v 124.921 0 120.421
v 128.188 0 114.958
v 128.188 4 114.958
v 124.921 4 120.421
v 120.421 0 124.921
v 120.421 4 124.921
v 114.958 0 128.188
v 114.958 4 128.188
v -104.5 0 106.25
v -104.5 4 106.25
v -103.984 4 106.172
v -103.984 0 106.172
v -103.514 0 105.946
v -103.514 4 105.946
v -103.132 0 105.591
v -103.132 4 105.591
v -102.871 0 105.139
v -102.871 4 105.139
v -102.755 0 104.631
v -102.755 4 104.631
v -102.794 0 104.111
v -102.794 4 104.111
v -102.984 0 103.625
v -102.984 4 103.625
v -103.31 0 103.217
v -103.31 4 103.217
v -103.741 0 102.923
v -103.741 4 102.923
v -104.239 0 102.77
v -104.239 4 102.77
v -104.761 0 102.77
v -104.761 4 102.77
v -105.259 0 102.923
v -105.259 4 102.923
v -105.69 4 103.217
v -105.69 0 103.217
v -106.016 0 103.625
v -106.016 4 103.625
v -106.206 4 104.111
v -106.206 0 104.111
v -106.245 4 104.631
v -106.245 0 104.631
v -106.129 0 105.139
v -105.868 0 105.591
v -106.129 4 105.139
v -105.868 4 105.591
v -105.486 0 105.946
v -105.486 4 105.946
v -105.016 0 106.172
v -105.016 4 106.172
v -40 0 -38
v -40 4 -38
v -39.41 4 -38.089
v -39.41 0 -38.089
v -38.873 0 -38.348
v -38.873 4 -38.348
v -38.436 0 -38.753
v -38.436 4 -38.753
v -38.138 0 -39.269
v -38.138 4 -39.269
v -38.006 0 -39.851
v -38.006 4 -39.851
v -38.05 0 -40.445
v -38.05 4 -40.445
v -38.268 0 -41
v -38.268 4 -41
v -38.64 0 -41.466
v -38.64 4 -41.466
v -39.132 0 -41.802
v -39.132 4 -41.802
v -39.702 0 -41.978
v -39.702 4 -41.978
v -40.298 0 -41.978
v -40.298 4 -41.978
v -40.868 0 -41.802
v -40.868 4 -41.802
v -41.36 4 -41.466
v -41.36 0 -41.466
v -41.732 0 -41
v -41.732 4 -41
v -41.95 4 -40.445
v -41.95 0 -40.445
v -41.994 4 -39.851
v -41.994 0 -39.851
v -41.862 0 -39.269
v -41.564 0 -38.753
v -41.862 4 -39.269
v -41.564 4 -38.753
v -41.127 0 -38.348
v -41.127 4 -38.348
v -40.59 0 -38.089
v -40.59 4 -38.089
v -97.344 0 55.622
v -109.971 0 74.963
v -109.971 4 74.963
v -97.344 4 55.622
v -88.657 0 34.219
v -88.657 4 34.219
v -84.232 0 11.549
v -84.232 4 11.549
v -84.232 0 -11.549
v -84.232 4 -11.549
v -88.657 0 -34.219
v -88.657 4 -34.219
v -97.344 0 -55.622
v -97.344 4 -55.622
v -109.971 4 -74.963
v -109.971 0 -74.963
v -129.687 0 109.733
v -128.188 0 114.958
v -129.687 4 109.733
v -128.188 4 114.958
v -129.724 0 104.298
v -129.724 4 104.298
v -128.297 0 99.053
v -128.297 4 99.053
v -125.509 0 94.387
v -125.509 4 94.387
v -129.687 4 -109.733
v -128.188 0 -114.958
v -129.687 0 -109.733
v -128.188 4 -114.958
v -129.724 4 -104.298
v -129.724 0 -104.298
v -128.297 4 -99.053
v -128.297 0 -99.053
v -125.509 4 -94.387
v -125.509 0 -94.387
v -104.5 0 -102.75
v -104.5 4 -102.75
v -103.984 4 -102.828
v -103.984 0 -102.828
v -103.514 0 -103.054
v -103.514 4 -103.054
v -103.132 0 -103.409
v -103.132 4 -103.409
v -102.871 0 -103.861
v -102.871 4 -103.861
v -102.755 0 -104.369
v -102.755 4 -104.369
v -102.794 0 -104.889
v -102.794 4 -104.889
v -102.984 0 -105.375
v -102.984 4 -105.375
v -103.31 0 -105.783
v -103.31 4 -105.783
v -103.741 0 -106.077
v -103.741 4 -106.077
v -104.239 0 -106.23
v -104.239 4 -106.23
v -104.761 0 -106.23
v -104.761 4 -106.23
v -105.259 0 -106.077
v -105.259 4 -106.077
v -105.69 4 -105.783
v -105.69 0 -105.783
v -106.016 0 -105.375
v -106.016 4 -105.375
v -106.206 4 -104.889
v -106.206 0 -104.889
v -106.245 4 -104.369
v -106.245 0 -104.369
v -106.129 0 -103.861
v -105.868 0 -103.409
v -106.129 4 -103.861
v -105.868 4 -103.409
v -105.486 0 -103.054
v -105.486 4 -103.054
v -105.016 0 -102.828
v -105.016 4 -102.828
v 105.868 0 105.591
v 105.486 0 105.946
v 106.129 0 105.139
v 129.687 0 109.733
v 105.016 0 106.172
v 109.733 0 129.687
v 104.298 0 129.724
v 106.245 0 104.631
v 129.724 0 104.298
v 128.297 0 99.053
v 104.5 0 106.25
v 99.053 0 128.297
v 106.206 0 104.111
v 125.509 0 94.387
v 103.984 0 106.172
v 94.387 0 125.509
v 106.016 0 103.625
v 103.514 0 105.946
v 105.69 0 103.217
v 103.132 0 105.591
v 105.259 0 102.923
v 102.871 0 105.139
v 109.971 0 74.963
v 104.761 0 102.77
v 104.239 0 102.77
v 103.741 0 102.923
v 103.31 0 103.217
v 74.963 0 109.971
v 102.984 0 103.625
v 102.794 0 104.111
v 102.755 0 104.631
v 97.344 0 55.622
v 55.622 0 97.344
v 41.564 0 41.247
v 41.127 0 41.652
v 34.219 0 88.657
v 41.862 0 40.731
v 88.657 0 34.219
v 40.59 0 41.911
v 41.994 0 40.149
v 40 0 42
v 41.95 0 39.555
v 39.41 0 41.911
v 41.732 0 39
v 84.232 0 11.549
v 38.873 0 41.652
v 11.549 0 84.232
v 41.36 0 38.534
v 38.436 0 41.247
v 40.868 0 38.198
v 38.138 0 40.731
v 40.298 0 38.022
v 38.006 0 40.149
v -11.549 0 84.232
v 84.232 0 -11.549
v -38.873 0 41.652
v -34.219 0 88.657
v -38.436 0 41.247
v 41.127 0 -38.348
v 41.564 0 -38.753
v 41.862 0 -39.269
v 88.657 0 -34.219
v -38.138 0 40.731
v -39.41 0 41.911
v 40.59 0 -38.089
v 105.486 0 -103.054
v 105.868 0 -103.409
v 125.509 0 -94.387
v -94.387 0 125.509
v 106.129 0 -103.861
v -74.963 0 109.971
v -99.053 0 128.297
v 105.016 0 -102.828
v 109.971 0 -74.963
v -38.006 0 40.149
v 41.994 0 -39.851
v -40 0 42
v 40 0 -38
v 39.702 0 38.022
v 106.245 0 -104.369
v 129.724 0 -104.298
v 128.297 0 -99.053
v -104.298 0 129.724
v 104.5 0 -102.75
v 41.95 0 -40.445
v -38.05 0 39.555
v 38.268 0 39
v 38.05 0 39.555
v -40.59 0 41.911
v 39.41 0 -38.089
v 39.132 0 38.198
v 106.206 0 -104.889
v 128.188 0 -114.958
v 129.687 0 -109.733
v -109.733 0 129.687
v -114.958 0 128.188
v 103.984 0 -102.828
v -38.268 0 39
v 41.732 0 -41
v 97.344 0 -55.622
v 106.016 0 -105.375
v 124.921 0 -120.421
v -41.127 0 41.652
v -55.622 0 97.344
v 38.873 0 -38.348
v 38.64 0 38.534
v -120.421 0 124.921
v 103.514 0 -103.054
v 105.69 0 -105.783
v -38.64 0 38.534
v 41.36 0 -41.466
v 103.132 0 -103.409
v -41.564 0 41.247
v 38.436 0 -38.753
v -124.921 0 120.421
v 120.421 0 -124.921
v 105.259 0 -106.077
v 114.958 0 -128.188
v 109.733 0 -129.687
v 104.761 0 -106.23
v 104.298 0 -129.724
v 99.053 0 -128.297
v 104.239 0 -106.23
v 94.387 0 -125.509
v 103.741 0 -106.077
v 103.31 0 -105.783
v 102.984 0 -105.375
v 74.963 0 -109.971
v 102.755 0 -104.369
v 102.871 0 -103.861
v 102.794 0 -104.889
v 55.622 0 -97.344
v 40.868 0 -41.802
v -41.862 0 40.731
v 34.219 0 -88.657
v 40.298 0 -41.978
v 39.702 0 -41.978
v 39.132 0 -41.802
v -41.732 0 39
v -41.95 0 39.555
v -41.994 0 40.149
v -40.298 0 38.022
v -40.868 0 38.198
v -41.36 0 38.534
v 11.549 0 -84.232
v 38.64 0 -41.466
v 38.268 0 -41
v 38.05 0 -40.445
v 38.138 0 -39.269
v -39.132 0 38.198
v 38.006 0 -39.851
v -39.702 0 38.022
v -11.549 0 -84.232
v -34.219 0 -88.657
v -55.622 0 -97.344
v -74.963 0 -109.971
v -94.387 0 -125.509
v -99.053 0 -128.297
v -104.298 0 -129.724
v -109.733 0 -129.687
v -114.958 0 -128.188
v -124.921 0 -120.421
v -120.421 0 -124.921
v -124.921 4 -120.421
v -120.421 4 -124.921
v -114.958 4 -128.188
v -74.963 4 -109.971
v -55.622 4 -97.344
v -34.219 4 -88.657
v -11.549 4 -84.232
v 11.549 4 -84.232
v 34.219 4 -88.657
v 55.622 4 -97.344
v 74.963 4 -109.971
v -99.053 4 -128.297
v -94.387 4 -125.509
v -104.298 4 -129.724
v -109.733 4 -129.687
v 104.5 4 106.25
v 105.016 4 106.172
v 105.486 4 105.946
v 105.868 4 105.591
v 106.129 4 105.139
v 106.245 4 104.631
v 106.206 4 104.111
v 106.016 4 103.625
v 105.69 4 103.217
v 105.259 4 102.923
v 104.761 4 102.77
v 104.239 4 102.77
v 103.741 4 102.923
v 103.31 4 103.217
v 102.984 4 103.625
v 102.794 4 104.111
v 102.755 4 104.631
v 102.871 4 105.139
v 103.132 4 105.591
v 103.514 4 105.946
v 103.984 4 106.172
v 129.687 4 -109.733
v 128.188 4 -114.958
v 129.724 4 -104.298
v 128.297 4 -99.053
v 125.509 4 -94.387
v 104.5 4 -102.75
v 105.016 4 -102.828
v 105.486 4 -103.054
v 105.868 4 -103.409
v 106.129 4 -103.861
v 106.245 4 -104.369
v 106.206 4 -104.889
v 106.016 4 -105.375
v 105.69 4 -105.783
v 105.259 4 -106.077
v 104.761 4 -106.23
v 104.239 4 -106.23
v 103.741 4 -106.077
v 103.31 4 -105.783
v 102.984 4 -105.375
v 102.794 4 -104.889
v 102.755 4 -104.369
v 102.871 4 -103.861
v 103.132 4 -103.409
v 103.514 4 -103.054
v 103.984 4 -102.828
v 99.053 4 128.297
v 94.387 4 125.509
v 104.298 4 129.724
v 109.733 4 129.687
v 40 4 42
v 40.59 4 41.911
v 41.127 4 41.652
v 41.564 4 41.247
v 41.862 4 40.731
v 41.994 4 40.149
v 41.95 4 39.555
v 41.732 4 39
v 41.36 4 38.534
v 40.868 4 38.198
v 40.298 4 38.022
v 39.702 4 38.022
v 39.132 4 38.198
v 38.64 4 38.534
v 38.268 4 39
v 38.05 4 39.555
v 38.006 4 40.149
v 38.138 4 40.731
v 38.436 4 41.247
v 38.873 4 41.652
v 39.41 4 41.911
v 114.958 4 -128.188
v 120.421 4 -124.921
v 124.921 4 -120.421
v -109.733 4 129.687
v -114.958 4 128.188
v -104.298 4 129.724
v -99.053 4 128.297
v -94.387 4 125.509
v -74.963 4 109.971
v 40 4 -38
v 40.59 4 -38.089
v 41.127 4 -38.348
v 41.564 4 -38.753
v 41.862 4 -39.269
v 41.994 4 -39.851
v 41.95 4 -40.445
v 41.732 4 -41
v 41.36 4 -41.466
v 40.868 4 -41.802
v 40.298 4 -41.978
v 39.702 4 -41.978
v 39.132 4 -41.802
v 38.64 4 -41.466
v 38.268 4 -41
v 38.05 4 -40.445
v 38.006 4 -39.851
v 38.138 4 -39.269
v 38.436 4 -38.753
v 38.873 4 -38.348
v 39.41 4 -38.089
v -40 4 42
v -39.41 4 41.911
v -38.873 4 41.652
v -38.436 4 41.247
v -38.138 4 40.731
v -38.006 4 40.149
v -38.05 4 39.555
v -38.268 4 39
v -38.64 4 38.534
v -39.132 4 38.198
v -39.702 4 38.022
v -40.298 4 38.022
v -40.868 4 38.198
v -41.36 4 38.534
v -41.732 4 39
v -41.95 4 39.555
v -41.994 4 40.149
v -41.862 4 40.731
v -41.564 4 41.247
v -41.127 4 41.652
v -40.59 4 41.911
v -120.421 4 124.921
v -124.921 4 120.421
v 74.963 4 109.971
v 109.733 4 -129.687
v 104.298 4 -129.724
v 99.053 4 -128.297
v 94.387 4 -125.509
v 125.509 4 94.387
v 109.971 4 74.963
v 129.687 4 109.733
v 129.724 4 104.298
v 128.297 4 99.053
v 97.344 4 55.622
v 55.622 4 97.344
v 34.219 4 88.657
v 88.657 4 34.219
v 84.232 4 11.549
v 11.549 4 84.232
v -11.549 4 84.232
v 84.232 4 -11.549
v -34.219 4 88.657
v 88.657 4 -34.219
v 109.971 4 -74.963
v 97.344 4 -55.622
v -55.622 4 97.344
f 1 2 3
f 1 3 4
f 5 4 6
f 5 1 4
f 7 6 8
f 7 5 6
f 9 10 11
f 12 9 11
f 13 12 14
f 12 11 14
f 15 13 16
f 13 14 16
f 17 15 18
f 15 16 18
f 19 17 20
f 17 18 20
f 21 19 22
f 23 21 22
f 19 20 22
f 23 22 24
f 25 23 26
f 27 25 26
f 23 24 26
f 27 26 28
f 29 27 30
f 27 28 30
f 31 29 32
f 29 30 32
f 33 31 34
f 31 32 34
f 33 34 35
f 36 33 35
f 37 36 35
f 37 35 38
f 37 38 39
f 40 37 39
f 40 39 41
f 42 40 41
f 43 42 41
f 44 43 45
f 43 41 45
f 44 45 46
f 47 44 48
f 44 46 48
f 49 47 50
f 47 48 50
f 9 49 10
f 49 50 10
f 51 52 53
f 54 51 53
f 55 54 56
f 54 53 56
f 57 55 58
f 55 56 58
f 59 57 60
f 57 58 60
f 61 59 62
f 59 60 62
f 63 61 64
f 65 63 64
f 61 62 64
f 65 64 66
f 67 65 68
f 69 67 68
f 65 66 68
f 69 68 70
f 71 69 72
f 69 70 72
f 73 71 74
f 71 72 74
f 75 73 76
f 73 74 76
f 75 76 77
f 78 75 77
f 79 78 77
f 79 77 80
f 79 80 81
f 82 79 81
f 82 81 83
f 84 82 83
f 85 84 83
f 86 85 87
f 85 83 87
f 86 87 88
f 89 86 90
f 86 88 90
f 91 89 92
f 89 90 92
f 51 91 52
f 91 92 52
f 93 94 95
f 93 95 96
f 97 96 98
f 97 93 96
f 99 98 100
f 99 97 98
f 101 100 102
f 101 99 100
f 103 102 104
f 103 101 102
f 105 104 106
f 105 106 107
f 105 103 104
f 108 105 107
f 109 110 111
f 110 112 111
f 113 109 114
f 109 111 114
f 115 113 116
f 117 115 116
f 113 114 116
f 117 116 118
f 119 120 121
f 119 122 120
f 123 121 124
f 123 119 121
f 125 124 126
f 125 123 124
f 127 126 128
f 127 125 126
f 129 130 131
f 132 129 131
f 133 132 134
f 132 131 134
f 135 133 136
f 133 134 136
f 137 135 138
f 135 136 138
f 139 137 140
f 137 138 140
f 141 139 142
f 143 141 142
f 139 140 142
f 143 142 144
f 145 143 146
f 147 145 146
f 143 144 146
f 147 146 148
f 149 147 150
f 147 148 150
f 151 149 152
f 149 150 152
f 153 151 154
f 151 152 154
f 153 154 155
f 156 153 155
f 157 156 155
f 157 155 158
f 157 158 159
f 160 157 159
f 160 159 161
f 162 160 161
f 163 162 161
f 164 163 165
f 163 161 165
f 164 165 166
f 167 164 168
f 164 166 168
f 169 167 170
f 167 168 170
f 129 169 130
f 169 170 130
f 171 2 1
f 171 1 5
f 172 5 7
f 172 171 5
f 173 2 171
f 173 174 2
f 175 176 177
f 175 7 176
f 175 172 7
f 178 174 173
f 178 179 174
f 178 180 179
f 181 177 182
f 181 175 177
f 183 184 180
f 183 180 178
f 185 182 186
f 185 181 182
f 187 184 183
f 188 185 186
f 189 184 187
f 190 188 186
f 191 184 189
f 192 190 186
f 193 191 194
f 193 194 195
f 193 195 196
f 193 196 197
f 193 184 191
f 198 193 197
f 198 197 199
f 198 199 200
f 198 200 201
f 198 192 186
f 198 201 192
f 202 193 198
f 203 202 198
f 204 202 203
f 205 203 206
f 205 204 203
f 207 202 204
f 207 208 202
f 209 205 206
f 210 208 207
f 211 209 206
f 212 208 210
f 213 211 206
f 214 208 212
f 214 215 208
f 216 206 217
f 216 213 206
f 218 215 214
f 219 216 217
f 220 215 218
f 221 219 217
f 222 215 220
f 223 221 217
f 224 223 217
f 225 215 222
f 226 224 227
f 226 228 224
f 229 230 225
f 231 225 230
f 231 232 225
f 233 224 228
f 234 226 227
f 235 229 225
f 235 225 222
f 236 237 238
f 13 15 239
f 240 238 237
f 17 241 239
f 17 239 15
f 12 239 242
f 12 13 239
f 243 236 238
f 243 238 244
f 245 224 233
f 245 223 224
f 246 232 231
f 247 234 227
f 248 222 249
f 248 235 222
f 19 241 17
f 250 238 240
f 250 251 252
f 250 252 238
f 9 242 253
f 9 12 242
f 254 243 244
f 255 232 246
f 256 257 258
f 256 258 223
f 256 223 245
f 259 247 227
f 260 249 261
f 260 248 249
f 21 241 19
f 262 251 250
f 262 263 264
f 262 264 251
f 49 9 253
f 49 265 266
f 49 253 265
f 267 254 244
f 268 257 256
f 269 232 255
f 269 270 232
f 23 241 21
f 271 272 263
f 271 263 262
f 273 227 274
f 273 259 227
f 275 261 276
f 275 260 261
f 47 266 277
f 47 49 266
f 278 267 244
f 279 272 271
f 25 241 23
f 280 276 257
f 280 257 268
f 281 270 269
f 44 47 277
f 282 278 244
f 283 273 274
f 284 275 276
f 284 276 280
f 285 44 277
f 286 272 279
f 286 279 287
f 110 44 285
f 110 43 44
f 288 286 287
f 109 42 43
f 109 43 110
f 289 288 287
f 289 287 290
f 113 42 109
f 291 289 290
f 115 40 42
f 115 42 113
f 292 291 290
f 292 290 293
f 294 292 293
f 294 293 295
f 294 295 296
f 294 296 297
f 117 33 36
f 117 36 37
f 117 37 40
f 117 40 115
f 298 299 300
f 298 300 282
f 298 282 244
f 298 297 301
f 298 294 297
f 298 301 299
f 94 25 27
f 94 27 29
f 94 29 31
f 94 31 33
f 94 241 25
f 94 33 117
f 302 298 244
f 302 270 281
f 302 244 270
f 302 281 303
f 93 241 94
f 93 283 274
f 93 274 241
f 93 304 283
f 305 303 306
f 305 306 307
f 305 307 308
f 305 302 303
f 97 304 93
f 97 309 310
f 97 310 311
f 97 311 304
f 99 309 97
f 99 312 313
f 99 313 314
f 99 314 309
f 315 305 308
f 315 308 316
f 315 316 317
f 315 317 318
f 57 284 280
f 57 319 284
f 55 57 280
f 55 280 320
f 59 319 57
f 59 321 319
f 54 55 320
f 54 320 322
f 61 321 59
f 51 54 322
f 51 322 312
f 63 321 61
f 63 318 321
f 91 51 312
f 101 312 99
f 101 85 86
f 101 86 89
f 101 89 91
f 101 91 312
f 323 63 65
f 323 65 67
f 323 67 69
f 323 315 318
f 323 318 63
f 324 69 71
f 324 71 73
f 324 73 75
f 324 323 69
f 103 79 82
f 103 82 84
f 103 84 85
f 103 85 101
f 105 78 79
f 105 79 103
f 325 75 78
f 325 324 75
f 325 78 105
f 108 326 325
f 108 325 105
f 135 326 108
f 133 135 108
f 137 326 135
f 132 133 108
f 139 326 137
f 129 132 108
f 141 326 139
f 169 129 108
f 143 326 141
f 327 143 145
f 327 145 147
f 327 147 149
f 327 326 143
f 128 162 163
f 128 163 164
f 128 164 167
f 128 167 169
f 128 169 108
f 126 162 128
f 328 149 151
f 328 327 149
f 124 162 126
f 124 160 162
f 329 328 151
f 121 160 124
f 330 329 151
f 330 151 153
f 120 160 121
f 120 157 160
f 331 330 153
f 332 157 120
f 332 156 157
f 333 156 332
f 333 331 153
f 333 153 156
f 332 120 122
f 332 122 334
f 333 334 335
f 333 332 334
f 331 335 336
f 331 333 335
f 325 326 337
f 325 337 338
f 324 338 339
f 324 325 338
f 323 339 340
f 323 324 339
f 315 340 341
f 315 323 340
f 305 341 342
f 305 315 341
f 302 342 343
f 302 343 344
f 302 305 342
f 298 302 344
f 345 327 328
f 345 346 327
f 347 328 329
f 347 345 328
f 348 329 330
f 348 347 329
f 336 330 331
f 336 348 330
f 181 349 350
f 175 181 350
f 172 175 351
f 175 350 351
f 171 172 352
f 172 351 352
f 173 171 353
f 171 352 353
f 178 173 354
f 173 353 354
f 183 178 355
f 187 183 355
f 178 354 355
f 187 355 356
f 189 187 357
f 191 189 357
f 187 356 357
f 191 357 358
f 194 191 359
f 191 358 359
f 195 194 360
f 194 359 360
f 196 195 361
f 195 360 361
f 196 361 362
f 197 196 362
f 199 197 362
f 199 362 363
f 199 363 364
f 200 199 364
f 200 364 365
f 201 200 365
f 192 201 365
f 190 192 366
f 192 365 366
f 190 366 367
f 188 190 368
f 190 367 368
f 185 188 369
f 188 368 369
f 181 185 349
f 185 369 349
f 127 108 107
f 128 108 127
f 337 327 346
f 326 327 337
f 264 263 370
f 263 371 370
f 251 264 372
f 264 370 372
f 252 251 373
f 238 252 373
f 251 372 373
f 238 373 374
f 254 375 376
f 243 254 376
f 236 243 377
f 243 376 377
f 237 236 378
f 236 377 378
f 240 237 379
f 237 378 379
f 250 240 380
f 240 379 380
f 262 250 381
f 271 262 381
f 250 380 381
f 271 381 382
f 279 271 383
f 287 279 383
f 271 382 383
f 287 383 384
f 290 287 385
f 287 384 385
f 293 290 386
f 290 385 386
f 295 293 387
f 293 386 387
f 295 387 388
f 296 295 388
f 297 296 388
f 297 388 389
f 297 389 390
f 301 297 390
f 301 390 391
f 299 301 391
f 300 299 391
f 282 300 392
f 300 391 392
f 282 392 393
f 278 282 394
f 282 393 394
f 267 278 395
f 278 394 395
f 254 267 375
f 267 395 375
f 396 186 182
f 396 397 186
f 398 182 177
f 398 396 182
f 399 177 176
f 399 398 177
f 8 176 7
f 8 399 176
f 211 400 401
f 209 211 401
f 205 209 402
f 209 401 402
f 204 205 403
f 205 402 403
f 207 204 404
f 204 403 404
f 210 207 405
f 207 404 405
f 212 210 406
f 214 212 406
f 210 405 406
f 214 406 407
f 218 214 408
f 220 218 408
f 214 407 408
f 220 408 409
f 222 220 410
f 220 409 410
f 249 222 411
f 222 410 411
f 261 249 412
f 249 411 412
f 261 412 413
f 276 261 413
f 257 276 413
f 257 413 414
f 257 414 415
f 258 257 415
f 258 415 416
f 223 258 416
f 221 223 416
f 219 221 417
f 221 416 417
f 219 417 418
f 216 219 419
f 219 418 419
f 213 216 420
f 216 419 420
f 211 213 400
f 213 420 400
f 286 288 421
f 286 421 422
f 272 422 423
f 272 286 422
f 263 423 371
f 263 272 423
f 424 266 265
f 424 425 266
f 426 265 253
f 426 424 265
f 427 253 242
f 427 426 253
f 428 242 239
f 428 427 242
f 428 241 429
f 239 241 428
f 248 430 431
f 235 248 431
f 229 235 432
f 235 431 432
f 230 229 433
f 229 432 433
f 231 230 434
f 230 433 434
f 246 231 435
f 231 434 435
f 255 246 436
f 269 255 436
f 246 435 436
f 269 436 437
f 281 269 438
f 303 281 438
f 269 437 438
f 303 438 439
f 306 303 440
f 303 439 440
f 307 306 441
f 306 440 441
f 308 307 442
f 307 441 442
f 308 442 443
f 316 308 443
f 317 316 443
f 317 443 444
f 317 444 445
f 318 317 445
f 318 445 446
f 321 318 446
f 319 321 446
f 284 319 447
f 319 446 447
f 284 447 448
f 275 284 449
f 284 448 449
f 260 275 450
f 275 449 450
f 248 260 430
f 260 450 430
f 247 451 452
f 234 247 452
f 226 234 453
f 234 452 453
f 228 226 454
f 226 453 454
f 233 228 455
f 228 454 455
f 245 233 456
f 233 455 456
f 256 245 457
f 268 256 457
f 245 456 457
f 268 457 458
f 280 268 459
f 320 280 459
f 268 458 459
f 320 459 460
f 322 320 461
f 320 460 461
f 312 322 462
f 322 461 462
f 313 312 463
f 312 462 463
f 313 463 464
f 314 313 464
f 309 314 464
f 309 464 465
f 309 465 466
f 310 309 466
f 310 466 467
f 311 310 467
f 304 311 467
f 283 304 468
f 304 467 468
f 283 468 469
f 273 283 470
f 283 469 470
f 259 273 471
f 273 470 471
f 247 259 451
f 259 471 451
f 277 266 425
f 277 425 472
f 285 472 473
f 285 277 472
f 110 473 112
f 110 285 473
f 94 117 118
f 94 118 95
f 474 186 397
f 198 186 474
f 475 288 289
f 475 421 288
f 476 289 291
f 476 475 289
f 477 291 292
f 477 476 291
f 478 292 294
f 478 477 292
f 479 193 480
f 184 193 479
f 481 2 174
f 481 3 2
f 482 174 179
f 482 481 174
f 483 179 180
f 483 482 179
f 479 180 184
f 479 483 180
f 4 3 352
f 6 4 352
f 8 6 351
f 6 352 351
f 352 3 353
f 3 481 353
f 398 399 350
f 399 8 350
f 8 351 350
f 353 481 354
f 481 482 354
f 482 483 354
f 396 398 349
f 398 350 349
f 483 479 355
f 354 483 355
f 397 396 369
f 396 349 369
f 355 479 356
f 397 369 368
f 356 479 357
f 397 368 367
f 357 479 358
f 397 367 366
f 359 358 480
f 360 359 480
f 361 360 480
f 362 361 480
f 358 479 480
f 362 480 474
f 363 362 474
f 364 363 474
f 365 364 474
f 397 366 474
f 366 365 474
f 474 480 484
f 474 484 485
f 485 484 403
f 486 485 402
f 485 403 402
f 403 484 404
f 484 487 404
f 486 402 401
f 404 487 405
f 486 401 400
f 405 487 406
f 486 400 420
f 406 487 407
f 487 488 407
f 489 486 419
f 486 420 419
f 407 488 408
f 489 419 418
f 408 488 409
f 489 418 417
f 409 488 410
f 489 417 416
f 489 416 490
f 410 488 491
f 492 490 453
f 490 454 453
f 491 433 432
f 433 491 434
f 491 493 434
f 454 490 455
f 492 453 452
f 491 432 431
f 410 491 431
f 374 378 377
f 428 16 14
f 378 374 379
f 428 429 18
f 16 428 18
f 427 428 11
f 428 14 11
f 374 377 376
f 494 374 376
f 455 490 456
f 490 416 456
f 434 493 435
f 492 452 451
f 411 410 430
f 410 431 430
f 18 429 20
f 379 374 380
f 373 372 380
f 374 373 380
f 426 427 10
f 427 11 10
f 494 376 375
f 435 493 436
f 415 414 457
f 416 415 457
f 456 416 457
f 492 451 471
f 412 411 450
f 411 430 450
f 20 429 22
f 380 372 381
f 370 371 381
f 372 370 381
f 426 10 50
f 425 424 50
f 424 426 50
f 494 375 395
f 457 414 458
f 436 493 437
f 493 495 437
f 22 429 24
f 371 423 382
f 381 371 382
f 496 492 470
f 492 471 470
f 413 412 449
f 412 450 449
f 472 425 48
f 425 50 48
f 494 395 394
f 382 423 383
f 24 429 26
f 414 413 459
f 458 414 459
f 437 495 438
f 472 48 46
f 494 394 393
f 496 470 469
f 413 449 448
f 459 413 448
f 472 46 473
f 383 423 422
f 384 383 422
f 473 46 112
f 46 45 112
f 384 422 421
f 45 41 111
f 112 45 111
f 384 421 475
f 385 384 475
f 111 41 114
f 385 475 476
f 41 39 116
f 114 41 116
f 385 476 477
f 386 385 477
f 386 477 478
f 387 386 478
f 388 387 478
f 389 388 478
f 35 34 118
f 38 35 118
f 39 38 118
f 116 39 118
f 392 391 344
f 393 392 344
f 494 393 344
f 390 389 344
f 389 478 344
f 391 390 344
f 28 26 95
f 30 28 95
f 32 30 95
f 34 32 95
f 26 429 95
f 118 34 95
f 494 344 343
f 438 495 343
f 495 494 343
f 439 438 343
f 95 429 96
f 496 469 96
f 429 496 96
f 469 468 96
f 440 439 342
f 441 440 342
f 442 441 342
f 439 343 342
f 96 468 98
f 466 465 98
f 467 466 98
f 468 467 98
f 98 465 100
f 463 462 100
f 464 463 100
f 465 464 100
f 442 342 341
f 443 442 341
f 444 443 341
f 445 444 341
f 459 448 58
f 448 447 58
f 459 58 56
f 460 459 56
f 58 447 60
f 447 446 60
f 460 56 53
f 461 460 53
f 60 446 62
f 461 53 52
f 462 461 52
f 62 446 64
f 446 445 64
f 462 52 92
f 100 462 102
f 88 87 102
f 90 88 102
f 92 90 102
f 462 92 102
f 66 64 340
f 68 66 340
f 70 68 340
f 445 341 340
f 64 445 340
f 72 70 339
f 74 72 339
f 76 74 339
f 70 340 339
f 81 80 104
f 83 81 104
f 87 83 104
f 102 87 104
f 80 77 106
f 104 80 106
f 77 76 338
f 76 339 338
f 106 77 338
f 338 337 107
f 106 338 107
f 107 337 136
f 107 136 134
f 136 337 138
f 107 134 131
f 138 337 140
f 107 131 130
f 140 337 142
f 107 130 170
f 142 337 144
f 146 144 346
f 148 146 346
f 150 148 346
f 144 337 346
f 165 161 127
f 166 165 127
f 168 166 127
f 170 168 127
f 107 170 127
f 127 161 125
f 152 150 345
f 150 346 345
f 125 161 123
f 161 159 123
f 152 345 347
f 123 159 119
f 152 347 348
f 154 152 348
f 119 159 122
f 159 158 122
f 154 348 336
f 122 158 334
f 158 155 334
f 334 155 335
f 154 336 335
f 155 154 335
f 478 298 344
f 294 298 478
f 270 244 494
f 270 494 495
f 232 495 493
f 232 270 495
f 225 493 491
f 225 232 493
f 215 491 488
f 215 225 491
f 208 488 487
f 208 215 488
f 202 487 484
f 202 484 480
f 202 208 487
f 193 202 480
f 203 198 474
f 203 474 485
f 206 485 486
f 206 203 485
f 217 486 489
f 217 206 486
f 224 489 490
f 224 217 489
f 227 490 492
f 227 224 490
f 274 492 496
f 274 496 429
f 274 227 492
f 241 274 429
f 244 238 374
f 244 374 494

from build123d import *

# Parameters (mm, degrees)
EXTRUDE_3_DEPTH     = 4
FILLET_3_R          = 20
FILLET_4_R          = 20
FILLET_5_R          = 20
FILLET_6_R          = 20
FILLET_7_R          = 20
FILLET_8_R          = 20
FILLET_9_R          = 20
FILLET_10_R         = 20
SKETCH_6_R          = 1.75
CUT_EXTRUDE_3_DEPTH = 4
SKETCH_7_R          = 2
CUT_EXTRUDE_4_DEPTH = 4


with BuildPart() as part:
    # Эскиз5 → Бобышка-Вытянуть3 (new body)
    with BuildSketch(Plane(origin=(0, 0, 0), x_dir=(1, 0, 0), z_dir=(0, 1, 0))):
        with BuildLine():
            Line((-100, 130), (-74.963405707, 109.970724565))
            ThreePointArc((-74.963405707, 109.970724565), (0, 83.674981698), (74.963405707, 109.970724565))
            Line((74.963405707, 109.970724565), (100, 130))
            ThreePointArc((100, 130), (122.809833424, 122.809833424), (130, 100))
            Line((130, 100), (109.970724565, 74.963405707))
            ThreePointArc((109.970724565, 74.963405707), (83.674981698, 0), (109.970724565, -74.963405707))
            Line((109.970724565, -74.963405707), (130, -100))
            ThreePointArc((130, -100), (122.809833424, -122.809833424), (100, -130))
            Line((100, -130), (74.963405707, -109.970724565))
            ThreePointArc((74.963405707, -109.970724565), (0, -83.674981698), (-74.963405707, -109.970724565))
            Line((-74.963405707, -109.970724565), (-100, -130))
            ThreePointArc((-100, -130), (-122.809833424, -122.809833424), (-130, -100))
            Line((-130, -100), (-109.970724565, -74.963405707))
            ThreePointArc((-109.970724565, -74.963405707), (-83.674981698, 0), (-109.970724565, 74.963405707))
            Line((-109.970724565, 74.963405707), (-130, 100))
            ThreePointArc((-130, 100), (-122.809833424, 122.809833424), (-100, 130))
        make_face()
    extrude(amount=EXTRUDE_3_DEPTH)

    # Скругление3
    fillet_3_edges = [part.edges().sort_by_distance(p)[0] for p in [
        (130, 2, -100),
    ]]
    fillet(fillet_3_edges, radius=FILLET_3_R)

    # Скругление4
    fillet_4_edges = [part.edges().sort_by_distance(p)[0] for p in [
        (100, 2, -130),
    ]]
    fillet(fillet_4_edges, radius=FILLET_4_R)

    # Скругление5
    fillet_5_edges = [part.edges().sort_by_distance(p)[0] for p in [
        (-100, 2, -130),
    ]]
    fillet(fillet_5_edges, radius=FILLET_5_R)

    # Скругление6
    fillet_6_edges = [part.edges().sort_by_distance(p)[0] for p in [
        (-130, 2, -100),
    ]]
    fillet(fillet_6_edges, radius=FILLET_6_R)

    # Скругление7
    fillet_7_edges = [part.edges().sort_by_distance(p)[0] for p in [
        (-100, 2, 130),
    ]]
    fillet(fillet_7_edges, radius=FILLET_7_R)

    # Скругление8
    fillet_8_edges = [part.edges().sort_by_distance(p)[0] for p in [
        (-130, 2, 100),
    ]]
    fillet(fillet_8_edges, radius=FILLET_8_R)

    # Скругление9
    fillet_9_edges = [part.edges().sort_by_distance(p)[0] for p in [
        (100, 2, 130),
    ]]
    fillet(fillet_9_edges, radius=FILLET_9_R)

    # Скругление10
    fillet_10_edges = [part.edges().sort_by_distance(p)[0] for p in [
        (130, 2, 100),
    ]]
    fillet(fillet_10_edges, radius=FILLET_10_R)

    # Эскиз6 → Вырез-Вытянуть3 (cut)
    with BuildSketch(Plane(origin=(0, 4, 0), x_dir=(1, 0, 0), z_dir=(0, 1, 0))):
        with Locations(Location((-104.5, 104.5, 0), (0, 0, 270))):
            Circle(SKETCH_6_R)
        with Locations(Location((104.5, 104.5, 0), (0, 0, 270))):
            Circle(SKETCH_6_R)
        with Locations(Location((104.5, -104.5, 0), (0, 0, 270))):
            Circle(SKETCH_6_R)
        with Locations(Location((-104.5, -104.5, 0), (0, 0, 270))):
            Circle(SKETCH_6_R)
    extrude(amount=-CUT_EXTRUDE_3_DEPTH, mode=Mode.SUBTRACT)

    # Эскиз7 → Вырез-Вытянуть4 (cut)
    with BuildSketch(Plane(origin=(0, 4, 0), x_dir=(1, 0, 0), z_dir=(0, 1, 0))):
        with Locations(Location((-40, 40, 0), (0, 0, 270))):
            Circle(SKETCH_7_R)
        with Locations(Location((40, 40, 0), (0, 0, 270))):
            Circle(SKETCH_7_R)
        with Locations(Location((40, -40, 0), (0, 0, 270))):
            Circle(SKETCH_7_R)
        with Locations(Location((-40, -40, 0), (0, 0, 270))):
            Circle(SKETCH_7_R)
    extrude(amount=-CUT_EXTRUDE_4_DEPTH, mode=Mode.SUBTRACT)


solid = part.part
